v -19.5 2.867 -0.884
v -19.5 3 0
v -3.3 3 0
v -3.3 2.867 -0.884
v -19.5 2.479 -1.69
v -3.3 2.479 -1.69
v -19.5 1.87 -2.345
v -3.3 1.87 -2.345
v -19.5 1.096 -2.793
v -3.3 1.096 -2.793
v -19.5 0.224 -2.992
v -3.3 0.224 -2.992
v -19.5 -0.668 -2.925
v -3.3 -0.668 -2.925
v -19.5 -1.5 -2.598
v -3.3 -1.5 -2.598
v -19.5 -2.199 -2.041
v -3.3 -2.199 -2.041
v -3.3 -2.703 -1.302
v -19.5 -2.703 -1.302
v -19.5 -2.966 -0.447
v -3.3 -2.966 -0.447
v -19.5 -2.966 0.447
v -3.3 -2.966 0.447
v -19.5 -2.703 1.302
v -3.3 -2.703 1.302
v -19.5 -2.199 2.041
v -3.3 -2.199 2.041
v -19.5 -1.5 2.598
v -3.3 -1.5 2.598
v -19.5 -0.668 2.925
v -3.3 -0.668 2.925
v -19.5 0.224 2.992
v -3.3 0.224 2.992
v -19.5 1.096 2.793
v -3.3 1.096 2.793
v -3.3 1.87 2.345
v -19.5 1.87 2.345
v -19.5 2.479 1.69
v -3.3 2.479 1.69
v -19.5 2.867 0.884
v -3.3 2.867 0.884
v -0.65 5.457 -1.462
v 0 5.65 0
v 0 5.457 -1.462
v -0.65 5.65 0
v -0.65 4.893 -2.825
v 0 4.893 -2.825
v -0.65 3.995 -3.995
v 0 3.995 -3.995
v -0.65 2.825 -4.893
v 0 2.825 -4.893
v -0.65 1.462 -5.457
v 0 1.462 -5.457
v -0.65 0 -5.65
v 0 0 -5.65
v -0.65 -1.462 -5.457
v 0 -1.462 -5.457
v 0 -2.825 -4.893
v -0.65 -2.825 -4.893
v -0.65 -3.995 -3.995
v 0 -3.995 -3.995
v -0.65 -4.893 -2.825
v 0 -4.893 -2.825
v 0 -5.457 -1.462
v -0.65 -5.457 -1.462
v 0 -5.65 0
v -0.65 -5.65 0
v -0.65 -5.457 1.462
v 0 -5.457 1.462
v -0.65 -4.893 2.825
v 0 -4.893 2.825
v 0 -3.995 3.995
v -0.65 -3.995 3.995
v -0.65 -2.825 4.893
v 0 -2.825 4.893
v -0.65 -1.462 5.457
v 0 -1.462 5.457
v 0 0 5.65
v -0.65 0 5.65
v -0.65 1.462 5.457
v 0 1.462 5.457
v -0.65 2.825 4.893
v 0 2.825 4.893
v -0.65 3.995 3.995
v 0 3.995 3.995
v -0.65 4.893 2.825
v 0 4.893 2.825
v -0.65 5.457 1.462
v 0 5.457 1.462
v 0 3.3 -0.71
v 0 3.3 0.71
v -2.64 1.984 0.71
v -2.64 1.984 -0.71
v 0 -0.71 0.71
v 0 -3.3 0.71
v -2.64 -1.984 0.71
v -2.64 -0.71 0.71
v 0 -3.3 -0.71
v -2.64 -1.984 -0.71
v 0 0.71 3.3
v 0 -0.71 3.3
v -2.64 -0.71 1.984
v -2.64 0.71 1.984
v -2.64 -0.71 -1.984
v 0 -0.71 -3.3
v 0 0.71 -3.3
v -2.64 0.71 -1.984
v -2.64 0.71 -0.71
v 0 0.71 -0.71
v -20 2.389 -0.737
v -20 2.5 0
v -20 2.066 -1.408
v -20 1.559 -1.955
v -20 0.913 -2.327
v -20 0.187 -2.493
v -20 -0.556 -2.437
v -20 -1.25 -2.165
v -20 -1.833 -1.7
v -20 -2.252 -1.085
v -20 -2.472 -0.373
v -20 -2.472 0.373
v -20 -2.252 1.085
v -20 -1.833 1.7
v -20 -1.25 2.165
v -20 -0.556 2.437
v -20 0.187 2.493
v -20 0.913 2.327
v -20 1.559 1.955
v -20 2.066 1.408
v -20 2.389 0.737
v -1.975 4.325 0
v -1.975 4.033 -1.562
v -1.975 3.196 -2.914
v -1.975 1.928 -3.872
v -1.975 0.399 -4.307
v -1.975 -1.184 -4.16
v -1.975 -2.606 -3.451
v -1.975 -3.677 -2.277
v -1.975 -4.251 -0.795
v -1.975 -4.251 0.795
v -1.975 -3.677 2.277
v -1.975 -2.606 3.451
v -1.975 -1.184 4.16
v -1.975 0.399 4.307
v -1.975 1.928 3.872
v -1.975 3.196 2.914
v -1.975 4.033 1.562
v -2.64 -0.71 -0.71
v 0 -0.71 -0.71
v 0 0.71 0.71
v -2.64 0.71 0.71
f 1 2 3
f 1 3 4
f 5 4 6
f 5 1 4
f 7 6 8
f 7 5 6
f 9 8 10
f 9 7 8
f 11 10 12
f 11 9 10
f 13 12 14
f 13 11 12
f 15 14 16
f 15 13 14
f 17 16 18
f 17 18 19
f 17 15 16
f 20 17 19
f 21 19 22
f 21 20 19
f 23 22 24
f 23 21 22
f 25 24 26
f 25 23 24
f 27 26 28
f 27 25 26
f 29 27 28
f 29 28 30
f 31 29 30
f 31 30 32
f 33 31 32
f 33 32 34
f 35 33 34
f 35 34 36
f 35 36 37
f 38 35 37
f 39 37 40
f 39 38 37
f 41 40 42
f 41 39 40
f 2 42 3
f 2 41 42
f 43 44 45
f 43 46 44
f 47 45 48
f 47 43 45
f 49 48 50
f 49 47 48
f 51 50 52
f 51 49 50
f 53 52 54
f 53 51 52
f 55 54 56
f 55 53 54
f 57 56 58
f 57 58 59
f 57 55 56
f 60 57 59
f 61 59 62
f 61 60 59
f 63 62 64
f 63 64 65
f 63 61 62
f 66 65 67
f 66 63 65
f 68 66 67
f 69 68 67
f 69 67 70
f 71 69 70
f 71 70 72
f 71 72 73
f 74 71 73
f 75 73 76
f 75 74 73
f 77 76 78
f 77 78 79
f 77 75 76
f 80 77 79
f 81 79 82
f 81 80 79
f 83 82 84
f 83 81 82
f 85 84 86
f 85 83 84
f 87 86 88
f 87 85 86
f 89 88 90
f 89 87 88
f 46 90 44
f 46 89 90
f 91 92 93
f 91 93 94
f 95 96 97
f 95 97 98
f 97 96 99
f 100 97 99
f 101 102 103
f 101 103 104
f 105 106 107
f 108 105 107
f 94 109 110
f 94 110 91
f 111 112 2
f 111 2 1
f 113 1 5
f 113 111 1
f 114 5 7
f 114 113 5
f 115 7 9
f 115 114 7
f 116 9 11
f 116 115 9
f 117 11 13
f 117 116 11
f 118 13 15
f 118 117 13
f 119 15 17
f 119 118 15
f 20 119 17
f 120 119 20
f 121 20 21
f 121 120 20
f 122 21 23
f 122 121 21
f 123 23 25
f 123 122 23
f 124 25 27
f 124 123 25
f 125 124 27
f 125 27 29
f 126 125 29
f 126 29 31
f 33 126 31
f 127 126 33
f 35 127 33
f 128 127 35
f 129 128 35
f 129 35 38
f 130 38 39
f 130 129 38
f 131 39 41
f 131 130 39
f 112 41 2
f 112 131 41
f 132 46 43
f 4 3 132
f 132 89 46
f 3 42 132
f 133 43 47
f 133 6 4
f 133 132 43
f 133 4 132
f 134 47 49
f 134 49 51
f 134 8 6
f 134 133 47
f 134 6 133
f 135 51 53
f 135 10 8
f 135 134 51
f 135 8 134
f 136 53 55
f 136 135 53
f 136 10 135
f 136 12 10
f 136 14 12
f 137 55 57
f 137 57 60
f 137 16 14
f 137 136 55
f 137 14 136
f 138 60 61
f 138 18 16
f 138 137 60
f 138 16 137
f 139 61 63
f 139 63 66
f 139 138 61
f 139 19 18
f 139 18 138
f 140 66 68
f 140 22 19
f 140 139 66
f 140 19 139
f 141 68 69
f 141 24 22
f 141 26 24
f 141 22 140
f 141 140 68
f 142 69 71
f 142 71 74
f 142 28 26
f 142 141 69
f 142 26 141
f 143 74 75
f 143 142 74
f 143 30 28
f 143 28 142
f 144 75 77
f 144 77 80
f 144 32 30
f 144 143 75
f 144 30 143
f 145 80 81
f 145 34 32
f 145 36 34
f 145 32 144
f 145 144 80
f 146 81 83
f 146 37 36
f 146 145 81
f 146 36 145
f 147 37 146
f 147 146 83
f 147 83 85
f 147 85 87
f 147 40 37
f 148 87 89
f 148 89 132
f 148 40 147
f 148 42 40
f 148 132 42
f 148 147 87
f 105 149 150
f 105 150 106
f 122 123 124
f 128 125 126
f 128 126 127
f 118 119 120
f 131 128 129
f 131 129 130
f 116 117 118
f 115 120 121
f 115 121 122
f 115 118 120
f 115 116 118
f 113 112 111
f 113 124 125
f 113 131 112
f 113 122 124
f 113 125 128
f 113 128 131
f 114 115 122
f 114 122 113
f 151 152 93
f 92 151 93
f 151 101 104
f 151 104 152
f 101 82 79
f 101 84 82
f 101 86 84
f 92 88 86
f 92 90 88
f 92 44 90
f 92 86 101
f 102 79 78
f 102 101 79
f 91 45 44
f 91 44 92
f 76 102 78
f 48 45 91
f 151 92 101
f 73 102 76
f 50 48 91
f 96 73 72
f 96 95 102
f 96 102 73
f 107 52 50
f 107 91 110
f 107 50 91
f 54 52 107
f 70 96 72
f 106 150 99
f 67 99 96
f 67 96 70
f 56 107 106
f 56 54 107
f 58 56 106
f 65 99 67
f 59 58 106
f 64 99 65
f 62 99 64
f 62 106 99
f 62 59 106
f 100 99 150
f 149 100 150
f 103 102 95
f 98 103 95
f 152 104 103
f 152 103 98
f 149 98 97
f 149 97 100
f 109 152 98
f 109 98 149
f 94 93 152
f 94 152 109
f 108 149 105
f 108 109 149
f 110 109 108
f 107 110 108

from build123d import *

# Parameters (mm, degrees)
SKETCH2_W          = 1.42
SKETCH2_H          = 2.59
SKETCH2_W_2        = 2.59
SKETCH2_H_2        = 1.42
CUT_EXTRUDE1_DEPTH = 2.64
DRAFT1_ANGLE       = 26.5
CHAMFER1_SIZE      = 0.5


with BuildPart() as part:
    # Sketch1 → Revolve1 (revolve)
    with BuildSketch(Plane.XY):
        Polygon((0, 0), (0, 5.65), (-0.65, 5.65), (-3.3, 3), (-20, 3), (-20, 0), align=None)
    revolve(axis=Axis((0, 0, 0), (-1, 0, 0)))

    # Sketch2 → Cut-Extrude1 (cut)
    with BuildSketch(Plane(origin=(0, 0, 0), x_dir=(0, 0, -1), z_dir=(1, 0, 0))):
        with Locations((0, 2.005)):
            Rectangle(SKETCH2_W, SKETCH2_H)
        with Locations((-2.005, 0)):
            Rectangle(SKETCH2_W_2, SKETCH2_H_2)
        Rectangle(SKETCH2_W, SKETCH2_H_2)
        with Locations((2.005, 0)):
            Rectangle(SKETCH2_W_2, SKETCH2_H_2)
        with Locations((0, -2.005)):
            Rectangle(SKETCH2_W, SKETCH2_H)
    extrude(amount=-CUT_EXTRUDE1_DEPTH, mode=Mode.SUBTRACT)

    # Draft1
    draft1_faces = [part.faces().sort_by_distance(p)[0] for p in [
        (-1.32, 0, -3.3),
        (-1.32, -3.3, 0),
        (-1.32, 0, 3.3),
        (-1.32, 3.3, 0),
    ]]
    draft(draft1_faces, Plane.YZ, DRAFT1_ANGLE)

    # Chamfer1
    chamfer1_edges = [part.edges().sort_by_distance(p)[0] for p in [
        (-20, -3, 0),
    ]]
    chamfer(chamfer1_edges, length=CHAMFER1_SIZE)


solid = part.part
